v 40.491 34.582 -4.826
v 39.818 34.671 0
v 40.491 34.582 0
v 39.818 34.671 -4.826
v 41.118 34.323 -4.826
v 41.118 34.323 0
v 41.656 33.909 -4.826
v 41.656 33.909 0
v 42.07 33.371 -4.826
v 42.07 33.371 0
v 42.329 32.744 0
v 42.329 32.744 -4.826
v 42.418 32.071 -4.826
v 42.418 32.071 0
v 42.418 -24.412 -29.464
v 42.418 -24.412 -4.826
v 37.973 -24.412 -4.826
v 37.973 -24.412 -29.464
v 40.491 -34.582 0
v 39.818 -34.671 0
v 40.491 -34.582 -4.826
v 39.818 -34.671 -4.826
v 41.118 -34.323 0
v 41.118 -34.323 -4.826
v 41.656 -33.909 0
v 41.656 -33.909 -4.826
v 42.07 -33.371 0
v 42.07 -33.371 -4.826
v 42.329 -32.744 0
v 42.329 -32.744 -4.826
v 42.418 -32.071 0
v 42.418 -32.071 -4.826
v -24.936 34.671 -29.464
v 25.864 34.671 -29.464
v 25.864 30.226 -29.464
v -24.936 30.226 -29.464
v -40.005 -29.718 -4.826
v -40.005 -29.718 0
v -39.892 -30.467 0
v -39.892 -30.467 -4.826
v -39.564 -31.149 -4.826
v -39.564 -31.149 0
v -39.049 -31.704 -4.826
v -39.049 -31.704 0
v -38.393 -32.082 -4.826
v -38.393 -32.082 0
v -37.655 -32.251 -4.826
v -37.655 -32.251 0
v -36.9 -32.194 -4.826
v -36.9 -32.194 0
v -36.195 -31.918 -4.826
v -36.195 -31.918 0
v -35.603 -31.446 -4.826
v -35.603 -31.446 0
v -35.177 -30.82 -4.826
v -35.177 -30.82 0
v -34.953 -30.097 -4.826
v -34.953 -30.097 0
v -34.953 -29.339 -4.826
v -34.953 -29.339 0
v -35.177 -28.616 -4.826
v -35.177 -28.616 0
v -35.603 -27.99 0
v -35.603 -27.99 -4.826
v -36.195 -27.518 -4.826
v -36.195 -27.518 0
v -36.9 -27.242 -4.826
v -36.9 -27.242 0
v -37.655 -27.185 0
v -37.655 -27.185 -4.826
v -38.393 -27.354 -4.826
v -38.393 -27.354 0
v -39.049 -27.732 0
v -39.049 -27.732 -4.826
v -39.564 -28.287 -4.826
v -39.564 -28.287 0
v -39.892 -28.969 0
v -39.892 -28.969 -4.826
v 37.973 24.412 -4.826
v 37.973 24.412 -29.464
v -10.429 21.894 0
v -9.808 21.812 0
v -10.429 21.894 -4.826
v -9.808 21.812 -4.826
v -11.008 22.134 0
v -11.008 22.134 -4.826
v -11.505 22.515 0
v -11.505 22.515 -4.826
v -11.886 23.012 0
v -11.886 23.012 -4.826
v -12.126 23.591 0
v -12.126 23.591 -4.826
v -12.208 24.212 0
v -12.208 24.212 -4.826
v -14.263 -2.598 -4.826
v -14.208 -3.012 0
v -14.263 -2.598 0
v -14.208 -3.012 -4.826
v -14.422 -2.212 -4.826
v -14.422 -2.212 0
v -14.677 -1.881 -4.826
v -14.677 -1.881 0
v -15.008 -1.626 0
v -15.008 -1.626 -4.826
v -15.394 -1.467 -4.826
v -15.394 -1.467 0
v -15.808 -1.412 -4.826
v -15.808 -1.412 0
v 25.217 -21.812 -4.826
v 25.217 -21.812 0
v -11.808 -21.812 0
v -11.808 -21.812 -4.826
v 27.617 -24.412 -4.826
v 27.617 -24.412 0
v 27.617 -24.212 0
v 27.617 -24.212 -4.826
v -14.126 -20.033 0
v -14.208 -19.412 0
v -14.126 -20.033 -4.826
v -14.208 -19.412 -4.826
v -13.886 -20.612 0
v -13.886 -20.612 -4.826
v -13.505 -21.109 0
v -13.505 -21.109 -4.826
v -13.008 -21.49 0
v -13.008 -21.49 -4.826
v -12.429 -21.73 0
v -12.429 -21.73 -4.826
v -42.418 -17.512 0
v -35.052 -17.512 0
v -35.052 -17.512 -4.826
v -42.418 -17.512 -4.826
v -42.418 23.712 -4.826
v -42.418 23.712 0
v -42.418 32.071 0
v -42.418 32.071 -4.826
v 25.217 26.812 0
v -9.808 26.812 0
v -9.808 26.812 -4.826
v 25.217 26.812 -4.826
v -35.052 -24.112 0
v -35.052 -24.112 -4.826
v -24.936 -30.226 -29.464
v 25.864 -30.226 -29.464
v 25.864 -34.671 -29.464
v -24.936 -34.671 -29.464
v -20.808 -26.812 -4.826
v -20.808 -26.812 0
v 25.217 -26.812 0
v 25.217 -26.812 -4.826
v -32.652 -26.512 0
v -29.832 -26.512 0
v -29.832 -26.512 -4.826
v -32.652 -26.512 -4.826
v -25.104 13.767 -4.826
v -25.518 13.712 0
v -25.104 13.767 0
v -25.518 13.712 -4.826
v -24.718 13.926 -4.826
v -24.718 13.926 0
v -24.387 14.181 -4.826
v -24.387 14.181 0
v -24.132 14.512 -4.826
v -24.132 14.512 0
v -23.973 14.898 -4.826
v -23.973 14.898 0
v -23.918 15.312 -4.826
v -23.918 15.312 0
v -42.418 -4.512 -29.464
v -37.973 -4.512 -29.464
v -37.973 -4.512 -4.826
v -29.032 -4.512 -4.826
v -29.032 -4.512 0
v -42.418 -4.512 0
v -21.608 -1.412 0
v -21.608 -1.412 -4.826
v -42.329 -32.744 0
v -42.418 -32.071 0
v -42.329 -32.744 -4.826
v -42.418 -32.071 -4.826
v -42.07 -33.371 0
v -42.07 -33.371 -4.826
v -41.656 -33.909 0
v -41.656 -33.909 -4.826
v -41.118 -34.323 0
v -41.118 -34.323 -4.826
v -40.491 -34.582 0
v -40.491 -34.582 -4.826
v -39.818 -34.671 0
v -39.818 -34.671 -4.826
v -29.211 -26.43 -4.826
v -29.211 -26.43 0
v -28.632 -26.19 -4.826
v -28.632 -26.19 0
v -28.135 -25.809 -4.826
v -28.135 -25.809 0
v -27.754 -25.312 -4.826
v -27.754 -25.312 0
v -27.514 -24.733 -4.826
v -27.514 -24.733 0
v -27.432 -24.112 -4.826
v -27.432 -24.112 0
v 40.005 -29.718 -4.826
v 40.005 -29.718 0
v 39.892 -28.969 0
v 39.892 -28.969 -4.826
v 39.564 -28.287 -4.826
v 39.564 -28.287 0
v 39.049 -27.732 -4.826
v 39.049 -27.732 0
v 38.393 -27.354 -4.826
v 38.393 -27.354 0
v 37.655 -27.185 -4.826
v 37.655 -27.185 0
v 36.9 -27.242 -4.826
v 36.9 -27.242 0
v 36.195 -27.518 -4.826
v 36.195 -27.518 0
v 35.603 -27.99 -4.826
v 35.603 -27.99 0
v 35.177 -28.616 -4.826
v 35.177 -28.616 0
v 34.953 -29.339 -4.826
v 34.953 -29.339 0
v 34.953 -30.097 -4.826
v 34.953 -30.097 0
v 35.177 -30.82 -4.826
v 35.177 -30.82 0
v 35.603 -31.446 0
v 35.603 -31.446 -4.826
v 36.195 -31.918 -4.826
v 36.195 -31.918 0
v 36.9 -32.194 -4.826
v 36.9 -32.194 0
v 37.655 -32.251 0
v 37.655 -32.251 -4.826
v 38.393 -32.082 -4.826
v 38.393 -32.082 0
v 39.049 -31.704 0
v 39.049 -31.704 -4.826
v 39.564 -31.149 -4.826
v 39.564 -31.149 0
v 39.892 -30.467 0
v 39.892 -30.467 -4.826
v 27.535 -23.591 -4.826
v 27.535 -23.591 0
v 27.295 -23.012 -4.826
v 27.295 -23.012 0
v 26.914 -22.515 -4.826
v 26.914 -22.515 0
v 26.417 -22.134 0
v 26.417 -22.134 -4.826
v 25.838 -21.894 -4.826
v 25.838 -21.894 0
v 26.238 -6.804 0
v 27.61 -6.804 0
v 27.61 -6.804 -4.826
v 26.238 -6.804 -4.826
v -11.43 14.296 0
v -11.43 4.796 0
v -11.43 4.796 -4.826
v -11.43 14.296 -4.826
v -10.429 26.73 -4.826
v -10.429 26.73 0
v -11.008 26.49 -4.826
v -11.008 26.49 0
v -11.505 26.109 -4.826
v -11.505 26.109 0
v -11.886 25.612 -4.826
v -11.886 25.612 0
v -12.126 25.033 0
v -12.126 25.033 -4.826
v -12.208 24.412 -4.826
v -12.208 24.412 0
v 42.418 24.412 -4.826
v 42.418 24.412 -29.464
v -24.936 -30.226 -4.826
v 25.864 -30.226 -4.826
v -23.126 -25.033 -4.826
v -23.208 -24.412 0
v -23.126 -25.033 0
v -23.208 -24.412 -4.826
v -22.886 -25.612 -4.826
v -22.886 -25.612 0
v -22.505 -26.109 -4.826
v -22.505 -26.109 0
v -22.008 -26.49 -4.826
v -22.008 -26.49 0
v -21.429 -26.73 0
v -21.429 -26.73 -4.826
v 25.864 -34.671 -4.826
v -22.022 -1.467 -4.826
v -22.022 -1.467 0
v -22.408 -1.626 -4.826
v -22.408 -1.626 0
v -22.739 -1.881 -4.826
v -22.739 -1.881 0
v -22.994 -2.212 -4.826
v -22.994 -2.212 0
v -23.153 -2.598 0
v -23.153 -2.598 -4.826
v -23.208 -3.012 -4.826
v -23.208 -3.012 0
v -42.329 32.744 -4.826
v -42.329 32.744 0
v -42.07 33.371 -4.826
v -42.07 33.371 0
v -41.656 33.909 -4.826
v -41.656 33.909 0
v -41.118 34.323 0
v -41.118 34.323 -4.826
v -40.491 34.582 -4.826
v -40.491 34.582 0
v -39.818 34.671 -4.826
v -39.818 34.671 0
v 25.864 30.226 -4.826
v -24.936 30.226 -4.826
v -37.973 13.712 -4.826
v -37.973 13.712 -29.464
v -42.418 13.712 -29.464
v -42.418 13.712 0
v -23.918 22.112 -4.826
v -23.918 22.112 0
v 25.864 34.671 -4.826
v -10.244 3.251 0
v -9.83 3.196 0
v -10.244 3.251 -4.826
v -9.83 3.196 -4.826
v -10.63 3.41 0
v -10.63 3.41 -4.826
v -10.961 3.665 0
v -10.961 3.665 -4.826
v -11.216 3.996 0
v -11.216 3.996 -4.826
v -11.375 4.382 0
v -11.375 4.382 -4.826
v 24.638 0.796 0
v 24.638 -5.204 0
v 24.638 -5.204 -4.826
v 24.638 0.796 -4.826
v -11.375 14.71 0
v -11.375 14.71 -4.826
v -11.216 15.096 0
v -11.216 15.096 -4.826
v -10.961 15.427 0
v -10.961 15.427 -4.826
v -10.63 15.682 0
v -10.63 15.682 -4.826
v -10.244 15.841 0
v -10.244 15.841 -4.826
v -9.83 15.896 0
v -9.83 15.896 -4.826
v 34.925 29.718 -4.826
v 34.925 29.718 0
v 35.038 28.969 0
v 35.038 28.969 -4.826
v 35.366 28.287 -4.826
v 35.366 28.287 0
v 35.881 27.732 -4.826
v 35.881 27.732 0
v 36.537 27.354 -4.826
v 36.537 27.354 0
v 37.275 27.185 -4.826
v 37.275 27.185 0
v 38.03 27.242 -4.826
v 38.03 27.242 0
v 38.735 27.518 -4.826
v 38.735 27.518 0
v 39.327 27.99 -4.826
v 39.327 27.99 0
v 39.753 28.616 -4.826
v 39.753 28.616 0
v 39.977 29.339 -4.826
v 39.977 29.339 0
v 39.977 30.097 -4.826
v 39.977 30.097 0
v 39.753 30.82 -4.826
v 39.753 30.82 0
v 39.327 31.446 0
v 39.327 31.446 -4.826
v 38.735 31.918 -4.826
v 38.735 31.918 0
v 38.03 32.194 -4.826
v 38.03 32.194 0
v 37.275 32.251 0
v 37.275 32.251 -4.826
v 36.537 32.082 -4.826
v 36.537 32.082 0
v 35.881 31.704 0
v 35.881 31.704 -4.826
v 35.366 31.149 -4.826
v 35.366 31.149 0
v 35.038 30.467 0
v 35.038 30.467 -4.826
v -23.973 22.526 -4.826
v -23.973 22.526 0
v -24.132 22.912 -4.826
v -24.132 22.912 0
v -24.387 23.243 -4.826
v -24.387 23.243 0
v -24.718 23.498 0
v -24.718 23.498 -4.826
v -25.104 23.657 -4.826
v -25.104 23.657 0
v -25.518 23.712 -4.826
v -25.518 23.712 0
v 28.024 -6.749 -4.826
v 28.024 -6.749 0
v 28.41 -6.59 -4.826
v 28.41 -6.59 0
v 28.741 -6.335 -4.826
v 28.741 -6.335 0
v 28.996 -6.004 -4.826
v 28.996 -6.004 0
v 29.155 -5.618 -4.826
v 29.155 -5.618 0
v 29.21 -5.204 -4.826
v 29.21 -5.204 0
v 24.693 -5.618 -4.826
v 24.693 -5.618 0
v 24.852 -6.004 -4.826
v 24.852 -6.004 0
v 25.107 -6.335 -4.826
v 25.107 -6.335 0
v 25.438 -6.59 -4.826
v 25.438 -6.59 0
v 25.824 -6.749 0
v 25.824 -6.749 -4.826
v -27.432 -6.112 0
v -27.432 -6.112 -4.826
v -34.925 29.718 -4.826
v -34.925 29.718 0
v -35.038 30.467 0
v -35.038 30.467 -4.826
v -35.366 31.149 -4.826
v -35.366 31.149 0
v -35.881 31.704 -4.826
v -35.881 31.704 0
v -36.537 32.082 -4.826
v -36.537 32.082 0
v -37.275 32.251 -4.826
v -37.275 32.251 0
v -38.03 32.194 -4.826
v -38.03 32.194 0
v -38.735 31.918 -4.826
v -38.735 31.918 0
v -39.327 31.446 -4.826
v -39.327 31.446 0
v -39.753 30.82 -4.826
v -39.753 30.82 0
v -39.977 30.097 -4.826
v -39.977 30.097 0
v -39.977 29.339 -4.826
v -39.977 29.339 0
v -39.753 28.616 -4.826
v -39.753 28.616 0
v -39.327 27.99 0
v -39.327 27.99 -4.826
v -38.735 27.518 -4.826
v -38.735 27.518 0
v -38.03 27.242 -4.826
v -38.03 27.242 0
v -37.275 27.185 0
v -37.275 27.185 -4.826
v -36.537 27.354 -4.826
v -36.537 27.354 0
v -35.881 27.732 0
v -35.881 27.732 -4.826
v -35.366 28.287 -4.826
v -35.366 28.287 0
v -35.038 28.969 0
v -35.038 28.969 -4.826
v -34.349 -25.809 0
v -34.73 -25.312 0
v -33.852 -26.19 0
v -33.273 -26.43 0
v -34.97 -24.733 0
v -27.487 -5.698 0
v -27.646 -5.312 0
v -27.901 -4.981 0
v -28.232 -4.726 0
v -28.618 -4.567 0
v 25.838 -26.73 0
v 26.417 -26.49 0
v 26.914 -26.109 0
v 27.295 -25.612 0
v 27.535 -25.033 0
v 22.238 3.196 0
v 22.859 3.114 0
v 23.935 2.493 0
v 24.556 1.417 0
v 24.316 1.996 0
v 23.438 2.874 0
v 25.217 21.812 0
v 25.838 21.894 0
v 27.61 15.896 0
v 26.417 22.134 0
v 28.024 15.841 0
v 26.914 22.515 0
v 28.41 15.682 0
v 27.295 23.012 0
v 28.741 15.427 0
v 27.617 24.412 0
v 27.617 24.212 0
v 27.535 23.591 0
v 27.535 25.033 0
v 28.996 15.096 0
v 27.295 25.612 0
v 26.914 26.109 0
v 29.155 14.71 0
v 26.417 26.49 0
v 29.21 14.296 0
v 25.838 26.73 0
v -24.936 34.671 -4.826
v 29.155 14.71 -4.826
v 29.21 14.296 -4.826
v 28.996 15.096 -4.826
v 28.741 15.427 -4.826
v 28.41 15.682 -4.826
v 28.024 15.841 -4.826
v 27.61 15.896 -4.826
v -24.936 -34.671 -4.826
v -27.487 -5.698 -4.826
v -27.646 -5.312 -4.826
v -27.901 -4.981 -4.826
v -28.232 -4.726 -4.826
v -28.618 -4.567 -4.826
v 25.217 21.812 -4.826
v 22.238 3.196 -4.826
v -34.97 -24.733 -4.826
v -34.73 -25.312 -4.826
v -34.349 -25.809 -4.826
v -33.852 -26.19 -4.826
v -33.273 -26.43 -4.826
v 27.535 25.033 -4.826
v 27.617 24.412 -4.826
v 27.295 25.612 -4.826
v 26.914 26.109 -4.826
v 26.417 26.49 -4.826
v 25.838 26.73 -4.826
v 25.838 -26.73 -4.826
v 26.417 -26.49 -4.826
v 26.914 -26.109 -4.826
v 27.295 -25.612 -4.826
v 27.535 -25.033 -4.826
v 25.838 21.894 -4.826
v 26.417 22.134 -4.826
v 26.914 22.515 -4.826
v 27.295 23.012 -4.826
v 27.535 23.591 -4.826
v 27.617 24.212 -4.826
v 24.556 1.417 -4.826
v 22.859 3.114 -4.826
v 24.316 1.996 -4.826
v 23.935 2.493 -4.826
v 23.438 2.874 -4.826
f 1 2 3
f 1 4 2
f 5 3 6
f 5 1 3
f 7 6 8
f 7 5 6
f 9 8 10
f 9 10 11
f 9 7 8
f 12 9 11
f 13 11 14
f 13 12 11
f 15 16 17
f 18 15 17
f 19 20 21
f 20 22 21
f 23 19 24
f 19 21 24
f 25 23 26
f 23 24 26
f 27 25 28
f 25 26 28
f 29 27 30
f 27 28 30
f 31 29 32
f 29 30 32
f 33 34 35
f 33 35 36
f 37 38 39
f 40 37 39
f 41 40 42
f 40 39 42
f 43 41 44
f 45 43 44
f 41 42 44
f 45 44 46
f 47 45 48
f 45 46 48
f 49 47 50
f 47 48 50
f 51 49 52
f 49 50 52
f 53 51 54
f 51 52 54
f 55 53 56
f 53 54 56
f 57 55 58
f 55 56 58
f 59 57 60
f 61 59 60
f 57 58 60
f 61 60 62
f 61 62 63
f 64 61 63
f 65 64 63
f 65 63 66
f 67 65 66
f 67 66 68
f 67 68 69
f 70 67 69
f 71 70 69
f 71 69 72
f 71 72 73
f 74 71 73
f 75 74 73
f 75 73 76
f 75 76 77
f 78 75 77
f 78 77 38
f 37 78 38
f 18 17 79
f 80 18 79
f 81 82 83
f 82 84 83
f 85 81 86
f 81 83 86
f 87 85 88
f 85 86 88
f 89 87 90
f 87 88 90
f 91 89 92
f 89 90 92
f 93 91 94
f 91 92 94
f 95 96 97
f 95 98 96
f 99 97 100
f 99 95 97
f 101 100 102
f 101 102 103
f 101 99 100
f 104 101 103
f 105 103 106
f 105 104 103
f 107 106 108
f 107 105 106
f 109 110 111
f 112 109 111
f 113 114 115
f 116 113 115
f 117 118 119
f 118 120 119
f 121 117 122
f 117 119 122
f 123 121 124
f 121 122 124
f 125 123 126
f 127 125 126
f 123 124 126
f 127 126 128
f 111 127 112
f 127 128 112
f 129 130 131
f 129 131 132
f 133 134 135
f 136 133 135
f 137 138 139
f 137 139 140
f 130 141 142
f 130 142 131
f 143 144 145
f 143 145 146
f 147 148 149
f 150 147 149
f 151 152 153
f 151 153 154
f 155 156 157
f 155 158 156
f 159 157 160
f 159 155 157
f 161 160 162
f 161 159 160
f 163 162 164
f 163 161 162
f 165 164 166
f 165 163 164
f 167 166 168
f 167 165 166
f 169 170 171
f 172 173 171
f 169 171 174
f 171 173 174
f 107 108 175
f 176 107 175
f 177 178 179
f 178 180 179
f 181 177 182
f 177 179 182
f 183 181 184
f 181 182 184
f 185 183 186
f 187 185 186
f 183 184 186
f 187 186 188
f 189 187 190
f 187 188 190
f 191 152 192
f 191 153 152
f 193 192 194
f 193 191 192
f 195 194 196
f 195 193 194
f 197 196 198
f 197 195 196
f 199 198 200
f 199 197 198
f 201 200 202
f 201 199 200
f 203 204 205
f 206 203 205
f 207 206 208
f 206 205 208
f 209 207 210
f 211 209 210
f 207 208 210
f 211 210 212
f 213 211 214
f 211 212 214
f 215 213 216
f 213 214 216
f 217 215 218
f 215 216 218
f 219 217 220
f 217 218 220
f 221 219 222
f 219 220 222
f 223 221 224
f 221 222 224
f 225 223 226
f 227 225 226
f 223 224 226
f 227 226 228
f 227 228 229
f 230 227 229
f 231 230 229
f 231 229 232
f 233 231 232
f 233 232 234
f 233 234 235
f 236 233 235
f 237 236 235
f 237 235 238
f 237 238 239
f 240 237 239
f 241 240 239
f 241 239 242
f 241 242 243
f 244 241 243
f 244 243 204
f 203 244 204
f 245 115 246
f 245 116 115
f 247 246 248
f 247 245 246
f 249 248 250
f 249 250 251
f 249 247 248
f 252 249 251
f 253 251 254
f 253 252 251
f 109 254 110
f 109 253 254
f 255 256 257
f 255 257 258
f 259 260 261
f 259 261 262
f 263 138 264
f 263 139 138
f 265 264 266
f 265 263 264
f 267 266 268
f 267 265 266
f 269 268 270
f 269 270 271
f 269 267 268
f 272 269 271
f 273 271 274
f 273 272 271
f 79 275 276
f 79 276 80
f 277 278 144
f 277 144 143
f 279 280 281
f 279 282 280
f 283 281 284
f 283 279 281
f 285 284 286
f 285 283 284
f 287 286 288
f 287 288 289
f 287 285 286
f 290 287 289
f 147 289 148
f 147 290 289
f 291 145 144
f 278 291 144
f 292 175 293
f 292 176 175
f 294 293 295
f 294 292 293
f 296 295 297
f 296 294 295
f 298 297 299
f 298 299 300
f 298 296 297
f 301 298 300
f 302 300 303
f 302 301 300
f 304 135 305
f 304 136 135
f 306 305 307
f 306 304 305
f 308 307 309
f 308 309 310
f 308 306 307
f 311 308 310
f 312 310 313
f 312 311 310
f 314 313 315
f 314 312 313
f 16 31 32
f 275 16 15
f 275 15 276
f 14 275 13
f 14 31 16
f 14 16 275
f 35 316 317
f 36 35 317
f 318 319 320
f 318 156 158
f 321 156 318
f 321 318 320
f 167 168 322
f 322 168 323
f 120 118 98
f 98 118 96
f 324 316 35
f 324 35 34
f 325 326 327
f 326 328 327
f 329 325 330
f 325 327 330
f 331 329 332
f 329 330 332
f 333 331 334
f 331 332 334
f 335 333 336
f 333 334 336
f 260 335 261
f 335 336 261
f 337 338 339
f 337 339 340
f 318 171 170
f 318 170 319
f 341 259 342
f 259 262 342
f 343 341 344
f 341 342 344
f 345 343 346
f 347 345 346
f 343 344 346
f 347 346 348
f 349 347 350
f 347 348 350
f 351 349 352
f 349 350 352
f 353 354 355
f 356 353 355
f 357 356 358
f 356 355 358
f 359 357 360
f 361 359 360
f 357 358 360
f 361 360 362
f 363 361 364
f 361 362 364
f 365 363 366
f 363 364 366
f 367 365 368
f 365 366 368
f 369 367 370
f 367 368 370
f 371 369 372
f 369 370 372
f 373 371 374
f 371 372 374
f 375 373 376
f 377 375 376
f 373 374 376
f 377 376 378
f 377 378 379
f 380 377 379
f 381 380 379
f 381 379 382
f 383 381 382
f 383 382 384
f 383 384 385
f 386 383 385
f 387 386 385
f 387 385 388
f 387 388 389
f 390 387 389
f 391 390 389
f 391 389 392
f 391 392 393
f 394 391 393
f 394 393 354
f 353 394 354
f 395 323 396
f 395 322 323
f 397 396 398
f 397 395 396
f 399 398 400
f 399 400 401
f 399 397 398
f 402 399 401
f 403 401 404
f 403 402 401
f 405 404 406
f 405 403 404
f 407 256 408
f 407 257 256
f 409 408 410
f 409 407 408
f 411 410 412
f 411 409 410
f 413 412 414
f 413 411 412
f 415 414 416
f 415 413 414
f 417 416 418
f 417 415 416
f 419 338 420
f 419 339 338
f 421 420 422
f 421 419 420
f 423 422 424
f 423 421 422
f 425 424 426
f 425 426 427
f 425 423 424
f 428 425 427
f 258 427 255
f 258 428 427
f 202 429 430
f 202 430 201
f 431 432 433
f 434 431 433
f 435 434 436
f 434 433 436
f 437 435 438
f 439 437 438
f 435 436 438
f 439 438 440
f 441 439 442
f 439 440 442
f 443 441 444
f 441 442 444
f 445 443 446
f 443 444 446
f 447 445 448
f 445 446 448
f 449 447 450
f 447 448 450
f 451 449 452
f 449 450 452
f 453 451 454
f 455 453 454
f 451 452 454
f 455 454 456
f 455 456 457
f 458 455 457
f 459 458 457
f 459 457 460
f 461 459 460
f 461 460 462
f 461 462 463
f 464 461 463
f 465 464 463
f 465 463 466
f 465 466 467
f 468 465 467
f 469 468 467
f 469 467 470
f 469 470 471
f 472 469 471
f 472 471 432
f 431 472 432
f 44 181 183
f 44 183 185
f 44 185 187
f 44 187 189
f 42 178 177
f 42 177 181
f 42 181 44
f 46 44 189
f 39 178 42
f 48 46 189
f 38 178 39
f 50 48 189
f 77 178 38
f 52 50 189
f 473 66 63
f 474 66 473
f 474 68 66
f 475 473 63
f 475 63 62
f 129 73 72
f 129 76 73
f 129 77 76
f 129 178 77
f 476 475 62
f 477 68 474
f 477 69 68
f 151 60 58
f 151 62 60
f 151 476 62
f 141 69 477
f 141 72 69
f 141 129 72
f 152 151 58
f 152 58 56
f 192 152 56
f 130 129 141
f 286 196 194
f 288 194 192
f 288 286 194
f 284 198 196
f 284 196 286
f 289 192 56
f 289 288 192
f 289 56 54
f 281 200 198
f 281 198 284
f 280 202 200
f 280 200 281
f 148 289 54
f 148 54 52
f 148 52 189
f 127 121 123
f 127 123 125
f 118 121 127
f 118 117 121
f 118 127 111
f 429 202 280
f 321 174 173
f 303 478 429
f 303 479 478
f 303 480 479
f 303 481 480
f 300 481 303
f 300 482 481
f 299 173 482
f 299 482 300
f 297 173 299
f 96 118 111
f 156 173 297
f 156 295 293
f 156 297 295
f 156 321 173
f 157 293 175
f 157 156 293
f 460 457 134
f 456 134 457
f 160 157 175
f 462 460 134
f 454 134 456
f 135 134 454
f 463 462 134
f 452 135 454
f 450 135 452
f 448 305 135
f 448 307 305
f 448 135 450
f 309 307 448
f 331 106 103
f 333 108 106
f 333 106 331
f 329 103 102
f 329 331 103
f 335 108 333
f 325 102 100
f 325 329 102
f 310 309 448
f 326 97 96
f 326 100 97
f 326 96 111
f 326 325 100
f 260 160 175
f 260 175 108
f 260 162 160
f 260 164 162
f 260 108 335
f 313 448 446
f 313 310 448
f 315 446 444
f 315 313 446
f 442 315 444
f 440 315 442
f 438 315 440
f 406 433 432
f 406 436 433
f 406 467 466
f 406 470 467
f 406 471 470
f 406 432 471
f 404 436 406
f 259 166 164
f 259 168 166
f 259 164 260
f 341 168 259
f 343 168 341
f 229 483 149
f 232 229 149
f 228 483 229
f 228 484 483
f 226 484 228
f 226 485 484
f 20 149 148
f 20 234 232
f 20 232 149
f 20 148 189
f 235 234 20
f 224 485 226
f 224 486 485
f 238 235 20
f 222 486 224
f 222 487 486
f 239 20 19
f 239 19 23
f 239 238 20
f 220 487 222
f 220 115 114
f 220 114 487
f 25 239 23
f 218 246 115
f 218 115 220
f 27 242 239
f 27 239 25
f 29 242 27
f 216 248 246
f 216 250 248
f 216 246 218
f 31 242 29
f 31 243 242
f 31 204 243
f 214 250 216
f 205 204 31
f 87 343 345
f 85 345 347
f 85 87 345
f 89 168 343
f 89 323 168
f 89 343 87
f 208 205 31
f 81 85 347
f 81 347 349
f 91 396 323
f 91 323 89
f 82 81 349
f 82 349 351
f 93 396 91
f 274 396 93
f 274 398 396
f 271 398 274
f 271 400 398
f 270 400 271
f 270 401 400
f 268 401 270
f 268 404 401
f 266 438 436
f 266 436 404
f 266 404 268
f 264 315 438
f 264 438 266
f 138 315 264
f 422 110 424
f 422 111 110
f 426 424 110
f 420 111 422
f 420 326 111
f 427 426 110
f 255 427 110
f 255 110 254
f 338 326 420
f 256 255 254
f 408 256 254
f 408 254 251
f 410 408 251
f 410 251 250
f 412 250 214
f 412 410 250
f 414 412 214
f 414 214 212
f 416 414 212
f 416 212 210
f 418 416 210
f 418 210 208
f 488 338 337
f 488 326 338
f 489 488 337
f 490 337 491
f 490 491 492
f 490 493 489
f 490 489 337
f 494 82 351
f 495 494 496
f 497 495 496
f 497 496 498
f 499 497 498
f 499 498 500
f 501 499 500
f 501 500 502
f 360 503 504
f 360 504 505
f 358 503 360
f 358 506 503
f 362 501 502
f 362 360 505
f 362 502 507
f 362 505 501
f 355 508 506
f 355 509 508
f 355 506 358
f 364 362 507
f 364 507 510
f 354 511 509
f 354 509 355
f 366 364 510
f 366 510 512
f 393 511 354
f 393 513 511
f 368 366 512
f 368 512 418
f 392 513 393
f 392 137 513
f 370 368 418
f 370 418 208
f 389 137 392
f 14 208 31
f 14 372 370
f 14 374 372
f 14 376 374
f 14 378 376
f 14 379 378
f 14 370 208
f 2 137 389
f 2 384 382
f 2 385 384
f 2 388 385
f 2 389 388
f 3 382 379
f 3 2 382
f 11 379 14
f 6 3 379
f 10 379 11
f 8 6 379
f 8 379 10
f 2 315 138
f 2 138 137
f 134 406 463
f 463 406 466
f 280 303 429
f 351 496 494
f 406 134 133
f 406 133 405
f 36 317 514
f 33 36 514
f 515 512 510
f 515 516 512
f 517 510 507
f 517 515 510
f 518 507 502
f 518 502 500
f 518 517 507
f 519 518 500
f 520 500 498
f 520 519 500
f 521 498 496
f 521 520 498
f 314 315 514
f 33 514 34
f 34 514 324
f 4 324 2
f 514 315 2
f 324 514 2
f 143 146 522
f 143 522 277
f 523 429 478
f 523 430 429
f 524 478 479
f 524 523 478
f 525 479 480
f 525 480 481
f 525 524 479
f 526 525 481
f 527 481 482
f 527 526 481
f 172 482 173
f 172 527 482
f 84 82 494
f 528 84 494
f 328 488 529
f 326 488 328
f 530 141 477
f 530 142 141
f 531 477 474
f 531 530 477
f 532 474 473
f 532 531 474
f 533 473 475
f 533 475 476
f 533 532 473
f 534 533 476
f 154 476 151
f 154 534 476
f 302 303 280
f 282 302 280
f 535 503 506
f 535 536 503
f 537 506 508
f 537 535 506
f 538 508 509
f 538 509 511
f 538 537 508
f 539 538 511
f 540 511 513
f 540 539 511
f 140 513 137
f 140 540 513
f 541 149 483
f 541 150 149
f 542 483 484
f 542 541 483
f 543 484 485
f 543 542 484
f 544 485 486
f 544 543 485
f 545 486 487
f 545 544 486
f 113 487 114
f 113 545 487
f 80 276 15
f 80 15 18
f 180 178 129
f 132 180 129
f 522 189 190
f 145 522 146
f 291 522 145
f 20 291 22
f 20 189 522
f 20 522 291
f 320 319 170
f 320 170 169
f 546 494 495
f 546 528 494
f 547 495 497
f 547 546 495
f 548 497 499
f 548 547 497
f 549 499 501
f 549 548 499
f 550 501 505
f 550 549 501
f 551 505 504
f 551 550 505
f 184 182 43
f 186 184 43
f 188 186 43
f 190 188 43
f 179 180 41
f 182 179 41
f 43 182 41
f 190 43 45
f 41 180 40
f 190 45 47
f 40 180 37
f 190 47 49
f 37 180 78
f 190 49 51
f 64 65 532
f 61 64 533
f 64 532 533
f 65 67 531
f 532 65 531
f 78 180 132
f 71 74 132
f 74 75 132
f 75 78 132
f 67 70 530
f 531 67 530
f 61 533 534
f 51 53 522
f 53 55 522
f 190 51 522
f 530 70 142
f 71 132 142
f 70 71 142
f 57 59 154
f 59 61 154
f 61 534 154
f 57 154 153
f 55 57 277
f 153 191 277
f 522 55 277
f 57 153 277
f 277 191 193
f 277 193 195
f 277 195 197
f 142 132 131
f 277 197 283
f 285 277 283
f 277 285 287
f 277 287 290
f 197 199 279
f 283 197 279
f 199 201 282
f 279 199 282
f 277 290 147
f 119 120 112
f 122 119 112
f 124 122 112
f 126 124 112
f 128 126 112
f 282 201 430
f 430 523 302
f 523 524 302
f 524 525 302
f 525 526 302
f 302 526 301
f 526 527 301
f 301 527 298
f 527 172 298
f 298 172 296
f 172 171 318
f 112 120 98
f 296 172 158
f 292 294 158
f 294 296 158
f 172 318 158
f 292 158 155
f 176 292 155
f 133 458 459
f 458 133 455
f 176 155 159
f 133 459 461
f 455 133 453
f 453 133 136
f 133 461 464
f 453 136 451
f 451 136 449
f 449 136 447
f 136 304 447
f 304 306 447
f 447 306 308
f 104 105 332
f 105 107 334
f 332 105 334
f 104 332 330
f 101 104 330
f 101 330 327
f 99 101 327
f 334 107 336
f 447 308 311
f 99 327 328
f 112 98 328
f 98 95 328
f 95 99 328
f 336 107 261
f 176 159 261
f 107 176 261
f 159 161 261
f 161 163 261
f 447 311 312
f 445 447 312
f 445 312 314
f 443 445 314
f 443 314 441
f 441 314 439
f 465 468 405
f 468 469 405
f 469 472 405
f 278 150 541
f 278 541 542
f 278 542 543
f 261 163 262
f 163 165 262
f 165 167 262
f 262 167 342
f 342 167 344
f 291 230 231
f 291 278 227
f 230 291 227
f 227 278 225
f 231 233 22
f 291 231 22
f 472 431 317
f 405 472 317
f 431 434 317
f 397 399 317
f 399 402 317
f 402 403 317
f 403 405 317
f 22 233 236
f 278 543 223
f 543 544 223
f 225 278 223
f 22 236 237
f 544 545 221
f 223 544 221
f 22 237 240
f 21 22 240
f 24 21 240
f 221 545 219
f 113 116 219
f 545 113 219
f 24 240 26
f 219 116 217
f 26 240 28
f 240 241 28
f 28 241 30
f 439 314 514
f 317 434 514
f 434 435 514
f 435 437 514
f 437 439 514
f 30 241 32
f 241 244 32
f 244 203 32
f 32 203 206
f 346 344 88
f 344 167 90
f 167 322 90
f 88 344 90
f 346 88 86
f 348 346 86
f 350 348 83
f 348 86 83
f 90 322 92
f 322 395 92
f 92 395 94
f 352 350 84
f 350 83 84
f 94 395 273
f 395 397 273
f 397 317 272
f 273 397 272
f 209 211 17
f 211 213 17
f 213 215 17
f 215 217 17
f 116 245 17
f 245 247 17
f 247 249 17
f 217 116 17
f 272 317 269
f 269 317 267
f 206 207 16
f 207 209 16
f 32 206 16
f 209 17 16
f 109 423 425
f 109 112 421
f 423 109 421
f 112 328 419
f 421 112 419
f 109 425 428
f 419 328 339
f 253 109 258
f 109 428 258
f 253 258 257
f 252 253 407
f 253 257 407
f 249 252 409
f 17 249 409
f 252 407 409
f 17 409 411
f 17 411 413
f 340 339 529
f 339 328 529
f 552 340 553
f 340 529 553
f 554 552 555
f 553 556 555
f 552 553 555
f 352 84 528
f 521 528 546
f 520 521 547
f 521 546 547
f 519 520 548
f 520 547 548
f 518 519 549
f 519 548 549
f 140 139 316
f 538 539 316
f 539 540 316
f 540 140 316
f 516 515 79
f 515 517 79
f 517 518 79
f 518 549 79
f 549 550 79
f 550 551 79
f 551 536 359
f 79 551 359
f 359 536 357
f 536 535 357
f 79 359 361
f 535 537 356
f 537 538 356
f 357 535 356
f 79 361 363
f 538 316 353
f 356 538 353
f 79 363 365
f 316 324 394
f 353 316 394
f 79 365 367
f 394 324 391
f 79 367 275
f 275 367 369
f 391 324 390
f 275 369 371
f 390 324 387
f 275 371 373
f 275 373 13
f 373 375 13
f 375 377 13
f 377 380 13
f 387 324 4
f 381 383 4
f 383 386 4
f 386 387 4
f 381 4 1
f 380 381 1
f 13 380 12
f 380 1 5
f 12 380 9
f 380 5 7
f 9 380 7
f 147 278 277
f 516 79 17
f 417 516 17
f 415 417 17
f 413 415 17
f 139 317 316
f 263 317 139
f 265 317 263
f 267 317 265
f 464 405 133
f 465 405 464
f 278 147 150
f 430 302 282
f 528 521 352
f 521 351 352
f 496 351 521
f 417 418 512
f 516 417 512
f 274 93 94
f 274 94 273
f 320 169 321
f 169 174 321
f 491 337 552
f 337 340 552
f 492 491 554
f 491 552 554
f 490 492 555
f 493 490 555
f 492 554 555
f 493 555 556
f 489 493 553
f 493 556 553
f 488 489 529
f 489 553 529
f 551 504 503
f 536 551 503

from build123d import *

# Parameters (mm, degrees)
SKETCH1_W           = 84.836
SKETCH1_H           = 69.342
BASE_FLANGE1_DEPTH  = 4.826
SKETCH6_R           = 2.54
CUT_EXTRUDE1_DEPTH  = 10
FILLET1_R           = 2.6
SKETCH7_W           = 18.5
SKETCH7_H           = 10
SKETCH7_W_2         = 39.8249902
SKETCH7_H_2         = 5
CUT_EXTRUDE2_DEPTH  = 4.826
FILLET2_R           = 2.4
FILLET3_R           = 1.6
SKETCH11_W          = 4.445
SKETCH11_H          = 18.2239968
SKETCH11_H_2        = 48.82401137
SKETCH11_W_2        = 50.8
SKETCH11_H_3        = 4.445
BOSS_EXTRUDE1_DEPTH = 24.638


# Sheet-metal steps are written as plain solids
with BuildPart() as part:
    # Sketch1 → Base-Flange1 (new body)
    with BuildSketch(Plane.XY):
        Rectangle(SKETCH1_W, SKETCH1_H)
    extrude(amount=-BASE_FLANGE1_DEPTH)

    # Sketch6 → Cut-Extrude1 (cut)
    with BuildSketch(Plane.XY):
        with Locations((-37.465, 29.718)):
            Circle(SKETCH6_R)
        with Locations(Location((-37.465, -29.718, 0), (0, 0, 180))):
            Circle(SKETCH6_R)
        with Locations((37.465, -29.718)):
            Circle(SKETCH6_R)
        with Locations(Location((37.465, 29.718, 0), (0, 0, 180))):
            Circle(SKETCH6_R)
    extrude(amount=-CUT_EXTRUDE1_DEPTH, mode=Mode.SUBTRACT)

    # Fillet1
    fillet1_edges = [part.edges().sort_by_distance(p)[0] for p in [
        (-42.418, 34.671, -2.413),
        (42.418, 34.671, -2.413),
        (42.418, -34.671, -2.413),
        (-42.418, -34.671, -2.413),
    ]]
    fillet(fillet1_edges, radius=FILLET1_R)

    # Sketch7 → Cut-Extrude2 (cut)
    with BuildSketch(Plane.XY):
        with Locations((-33.168, 18.7119922)):
            Rectangle(SKETCH7_W, SKETCH7_H)
        Polygon((-42.418, -4.5120046), (-27.432, -4.5120046), (-27.432, -26.512012), (-35.052, -26.512012), (-35.052, -17.5120046), (-42.418, -17.5120046), align=None)
        with Locations((7.7044931, 24.3120114)):
            Rectangle(SKETCH7_W_2, SKETCH7_H_2)
        Polygon((-14.2080054, -21.81200997), (-14.2080054, -1.41199997), (-23.2080054, -1.41199997), (-23.2080054, -26.81199997), (27.6169882, -26.81199997), (27.6169882, -21.81200997), align=None)
        Polygon((24.638, 3.195999958), (-11.43, 3.195999958), (-11.43, 15.895999958), (29.21, 15.895999958), (29.21, 3.195999958), (29.21, -6.804000042), (24.638, -6.804000042), align=None)
    extrude(amount=-CUT_EXTRUDE2_DEPTH, mode=Mode.SUBTRACT)

    # Fillet2
    fillet2_edges = [part.edges().sort_by_distance(p)[0] for p in [
        (-12.208002, 21.8120114, -2.413),
        (-12.208002, 26.8120114, -2.413),
        (27.6169882, 26.8120114, -2.413),
        (27.6169882, 21.8120114, -2.413),
        (27.6169882, -21.81200997, -2.413),
        (27.6169882, -26.81199997, -2.413),
        (-23.2080054, -26.81199997, -2.413),
        (-14.2080054, -21.81200997, -2.413),
        (24.638, 3.195999958, -2.413),
        (-27.432, -26.512012, -2.413),
        (-35.052, -26.512012, -2.413),
    ]]
    fillet(fillet2_edges, radius=FILLET2_R)

    # Fillet3
    fillet3_edges = [part.edges().sort_by_distance(p)[0] for p in [
        (-23.2080054, -1.41199997, -2.413),
        (-14.2080054, -1.41199997, -2.413),
        (24.638, -6.804000042, -2.413),
        (-11.43, 3.195999958, -2.413),
        (-11.43, 15.895999958, -2.413),
        (29.21, 15.895999958, -2.413),
        (29.21, -6.804000042, -2.413),
        (-23.918, 23.7119922, -2.413),
        (-23.918, 13.7119922, -2.413),
        (-27.432, -4.5120046, -2.413),
    ]]
    fillet(fillet3_edges, radius=FILLET3_R)

    # Sketch11 → Boss-Extrude1 (add)
    with BuildSketch(Plane(origin=(0, 0, -4.826), x_dir=(-1, 0, 0), z_dir=(0, 0, -1))):
        with Locations((40.1955, 4.5999938)):
            Rectangle(SKETCH11_W, SKETCH11_H)
        with Locations((-40.1955, 5.715e-06)):
            Rectangle(SKETCH11_W, SKETCH11_H_2)
        with Locations((-0.463533105, -32.4485)):
            Rectangle(SKETCH11_W_2, SKETCH11_H_3)
        with Locations((-0.463533105, 32.4485)):
            Rectangle(SKETCH11_W_2, SKETCH11_H_3)
    extrude(amount=BOSS_EXTRUDE1_DEPTH)


solid = part.part
